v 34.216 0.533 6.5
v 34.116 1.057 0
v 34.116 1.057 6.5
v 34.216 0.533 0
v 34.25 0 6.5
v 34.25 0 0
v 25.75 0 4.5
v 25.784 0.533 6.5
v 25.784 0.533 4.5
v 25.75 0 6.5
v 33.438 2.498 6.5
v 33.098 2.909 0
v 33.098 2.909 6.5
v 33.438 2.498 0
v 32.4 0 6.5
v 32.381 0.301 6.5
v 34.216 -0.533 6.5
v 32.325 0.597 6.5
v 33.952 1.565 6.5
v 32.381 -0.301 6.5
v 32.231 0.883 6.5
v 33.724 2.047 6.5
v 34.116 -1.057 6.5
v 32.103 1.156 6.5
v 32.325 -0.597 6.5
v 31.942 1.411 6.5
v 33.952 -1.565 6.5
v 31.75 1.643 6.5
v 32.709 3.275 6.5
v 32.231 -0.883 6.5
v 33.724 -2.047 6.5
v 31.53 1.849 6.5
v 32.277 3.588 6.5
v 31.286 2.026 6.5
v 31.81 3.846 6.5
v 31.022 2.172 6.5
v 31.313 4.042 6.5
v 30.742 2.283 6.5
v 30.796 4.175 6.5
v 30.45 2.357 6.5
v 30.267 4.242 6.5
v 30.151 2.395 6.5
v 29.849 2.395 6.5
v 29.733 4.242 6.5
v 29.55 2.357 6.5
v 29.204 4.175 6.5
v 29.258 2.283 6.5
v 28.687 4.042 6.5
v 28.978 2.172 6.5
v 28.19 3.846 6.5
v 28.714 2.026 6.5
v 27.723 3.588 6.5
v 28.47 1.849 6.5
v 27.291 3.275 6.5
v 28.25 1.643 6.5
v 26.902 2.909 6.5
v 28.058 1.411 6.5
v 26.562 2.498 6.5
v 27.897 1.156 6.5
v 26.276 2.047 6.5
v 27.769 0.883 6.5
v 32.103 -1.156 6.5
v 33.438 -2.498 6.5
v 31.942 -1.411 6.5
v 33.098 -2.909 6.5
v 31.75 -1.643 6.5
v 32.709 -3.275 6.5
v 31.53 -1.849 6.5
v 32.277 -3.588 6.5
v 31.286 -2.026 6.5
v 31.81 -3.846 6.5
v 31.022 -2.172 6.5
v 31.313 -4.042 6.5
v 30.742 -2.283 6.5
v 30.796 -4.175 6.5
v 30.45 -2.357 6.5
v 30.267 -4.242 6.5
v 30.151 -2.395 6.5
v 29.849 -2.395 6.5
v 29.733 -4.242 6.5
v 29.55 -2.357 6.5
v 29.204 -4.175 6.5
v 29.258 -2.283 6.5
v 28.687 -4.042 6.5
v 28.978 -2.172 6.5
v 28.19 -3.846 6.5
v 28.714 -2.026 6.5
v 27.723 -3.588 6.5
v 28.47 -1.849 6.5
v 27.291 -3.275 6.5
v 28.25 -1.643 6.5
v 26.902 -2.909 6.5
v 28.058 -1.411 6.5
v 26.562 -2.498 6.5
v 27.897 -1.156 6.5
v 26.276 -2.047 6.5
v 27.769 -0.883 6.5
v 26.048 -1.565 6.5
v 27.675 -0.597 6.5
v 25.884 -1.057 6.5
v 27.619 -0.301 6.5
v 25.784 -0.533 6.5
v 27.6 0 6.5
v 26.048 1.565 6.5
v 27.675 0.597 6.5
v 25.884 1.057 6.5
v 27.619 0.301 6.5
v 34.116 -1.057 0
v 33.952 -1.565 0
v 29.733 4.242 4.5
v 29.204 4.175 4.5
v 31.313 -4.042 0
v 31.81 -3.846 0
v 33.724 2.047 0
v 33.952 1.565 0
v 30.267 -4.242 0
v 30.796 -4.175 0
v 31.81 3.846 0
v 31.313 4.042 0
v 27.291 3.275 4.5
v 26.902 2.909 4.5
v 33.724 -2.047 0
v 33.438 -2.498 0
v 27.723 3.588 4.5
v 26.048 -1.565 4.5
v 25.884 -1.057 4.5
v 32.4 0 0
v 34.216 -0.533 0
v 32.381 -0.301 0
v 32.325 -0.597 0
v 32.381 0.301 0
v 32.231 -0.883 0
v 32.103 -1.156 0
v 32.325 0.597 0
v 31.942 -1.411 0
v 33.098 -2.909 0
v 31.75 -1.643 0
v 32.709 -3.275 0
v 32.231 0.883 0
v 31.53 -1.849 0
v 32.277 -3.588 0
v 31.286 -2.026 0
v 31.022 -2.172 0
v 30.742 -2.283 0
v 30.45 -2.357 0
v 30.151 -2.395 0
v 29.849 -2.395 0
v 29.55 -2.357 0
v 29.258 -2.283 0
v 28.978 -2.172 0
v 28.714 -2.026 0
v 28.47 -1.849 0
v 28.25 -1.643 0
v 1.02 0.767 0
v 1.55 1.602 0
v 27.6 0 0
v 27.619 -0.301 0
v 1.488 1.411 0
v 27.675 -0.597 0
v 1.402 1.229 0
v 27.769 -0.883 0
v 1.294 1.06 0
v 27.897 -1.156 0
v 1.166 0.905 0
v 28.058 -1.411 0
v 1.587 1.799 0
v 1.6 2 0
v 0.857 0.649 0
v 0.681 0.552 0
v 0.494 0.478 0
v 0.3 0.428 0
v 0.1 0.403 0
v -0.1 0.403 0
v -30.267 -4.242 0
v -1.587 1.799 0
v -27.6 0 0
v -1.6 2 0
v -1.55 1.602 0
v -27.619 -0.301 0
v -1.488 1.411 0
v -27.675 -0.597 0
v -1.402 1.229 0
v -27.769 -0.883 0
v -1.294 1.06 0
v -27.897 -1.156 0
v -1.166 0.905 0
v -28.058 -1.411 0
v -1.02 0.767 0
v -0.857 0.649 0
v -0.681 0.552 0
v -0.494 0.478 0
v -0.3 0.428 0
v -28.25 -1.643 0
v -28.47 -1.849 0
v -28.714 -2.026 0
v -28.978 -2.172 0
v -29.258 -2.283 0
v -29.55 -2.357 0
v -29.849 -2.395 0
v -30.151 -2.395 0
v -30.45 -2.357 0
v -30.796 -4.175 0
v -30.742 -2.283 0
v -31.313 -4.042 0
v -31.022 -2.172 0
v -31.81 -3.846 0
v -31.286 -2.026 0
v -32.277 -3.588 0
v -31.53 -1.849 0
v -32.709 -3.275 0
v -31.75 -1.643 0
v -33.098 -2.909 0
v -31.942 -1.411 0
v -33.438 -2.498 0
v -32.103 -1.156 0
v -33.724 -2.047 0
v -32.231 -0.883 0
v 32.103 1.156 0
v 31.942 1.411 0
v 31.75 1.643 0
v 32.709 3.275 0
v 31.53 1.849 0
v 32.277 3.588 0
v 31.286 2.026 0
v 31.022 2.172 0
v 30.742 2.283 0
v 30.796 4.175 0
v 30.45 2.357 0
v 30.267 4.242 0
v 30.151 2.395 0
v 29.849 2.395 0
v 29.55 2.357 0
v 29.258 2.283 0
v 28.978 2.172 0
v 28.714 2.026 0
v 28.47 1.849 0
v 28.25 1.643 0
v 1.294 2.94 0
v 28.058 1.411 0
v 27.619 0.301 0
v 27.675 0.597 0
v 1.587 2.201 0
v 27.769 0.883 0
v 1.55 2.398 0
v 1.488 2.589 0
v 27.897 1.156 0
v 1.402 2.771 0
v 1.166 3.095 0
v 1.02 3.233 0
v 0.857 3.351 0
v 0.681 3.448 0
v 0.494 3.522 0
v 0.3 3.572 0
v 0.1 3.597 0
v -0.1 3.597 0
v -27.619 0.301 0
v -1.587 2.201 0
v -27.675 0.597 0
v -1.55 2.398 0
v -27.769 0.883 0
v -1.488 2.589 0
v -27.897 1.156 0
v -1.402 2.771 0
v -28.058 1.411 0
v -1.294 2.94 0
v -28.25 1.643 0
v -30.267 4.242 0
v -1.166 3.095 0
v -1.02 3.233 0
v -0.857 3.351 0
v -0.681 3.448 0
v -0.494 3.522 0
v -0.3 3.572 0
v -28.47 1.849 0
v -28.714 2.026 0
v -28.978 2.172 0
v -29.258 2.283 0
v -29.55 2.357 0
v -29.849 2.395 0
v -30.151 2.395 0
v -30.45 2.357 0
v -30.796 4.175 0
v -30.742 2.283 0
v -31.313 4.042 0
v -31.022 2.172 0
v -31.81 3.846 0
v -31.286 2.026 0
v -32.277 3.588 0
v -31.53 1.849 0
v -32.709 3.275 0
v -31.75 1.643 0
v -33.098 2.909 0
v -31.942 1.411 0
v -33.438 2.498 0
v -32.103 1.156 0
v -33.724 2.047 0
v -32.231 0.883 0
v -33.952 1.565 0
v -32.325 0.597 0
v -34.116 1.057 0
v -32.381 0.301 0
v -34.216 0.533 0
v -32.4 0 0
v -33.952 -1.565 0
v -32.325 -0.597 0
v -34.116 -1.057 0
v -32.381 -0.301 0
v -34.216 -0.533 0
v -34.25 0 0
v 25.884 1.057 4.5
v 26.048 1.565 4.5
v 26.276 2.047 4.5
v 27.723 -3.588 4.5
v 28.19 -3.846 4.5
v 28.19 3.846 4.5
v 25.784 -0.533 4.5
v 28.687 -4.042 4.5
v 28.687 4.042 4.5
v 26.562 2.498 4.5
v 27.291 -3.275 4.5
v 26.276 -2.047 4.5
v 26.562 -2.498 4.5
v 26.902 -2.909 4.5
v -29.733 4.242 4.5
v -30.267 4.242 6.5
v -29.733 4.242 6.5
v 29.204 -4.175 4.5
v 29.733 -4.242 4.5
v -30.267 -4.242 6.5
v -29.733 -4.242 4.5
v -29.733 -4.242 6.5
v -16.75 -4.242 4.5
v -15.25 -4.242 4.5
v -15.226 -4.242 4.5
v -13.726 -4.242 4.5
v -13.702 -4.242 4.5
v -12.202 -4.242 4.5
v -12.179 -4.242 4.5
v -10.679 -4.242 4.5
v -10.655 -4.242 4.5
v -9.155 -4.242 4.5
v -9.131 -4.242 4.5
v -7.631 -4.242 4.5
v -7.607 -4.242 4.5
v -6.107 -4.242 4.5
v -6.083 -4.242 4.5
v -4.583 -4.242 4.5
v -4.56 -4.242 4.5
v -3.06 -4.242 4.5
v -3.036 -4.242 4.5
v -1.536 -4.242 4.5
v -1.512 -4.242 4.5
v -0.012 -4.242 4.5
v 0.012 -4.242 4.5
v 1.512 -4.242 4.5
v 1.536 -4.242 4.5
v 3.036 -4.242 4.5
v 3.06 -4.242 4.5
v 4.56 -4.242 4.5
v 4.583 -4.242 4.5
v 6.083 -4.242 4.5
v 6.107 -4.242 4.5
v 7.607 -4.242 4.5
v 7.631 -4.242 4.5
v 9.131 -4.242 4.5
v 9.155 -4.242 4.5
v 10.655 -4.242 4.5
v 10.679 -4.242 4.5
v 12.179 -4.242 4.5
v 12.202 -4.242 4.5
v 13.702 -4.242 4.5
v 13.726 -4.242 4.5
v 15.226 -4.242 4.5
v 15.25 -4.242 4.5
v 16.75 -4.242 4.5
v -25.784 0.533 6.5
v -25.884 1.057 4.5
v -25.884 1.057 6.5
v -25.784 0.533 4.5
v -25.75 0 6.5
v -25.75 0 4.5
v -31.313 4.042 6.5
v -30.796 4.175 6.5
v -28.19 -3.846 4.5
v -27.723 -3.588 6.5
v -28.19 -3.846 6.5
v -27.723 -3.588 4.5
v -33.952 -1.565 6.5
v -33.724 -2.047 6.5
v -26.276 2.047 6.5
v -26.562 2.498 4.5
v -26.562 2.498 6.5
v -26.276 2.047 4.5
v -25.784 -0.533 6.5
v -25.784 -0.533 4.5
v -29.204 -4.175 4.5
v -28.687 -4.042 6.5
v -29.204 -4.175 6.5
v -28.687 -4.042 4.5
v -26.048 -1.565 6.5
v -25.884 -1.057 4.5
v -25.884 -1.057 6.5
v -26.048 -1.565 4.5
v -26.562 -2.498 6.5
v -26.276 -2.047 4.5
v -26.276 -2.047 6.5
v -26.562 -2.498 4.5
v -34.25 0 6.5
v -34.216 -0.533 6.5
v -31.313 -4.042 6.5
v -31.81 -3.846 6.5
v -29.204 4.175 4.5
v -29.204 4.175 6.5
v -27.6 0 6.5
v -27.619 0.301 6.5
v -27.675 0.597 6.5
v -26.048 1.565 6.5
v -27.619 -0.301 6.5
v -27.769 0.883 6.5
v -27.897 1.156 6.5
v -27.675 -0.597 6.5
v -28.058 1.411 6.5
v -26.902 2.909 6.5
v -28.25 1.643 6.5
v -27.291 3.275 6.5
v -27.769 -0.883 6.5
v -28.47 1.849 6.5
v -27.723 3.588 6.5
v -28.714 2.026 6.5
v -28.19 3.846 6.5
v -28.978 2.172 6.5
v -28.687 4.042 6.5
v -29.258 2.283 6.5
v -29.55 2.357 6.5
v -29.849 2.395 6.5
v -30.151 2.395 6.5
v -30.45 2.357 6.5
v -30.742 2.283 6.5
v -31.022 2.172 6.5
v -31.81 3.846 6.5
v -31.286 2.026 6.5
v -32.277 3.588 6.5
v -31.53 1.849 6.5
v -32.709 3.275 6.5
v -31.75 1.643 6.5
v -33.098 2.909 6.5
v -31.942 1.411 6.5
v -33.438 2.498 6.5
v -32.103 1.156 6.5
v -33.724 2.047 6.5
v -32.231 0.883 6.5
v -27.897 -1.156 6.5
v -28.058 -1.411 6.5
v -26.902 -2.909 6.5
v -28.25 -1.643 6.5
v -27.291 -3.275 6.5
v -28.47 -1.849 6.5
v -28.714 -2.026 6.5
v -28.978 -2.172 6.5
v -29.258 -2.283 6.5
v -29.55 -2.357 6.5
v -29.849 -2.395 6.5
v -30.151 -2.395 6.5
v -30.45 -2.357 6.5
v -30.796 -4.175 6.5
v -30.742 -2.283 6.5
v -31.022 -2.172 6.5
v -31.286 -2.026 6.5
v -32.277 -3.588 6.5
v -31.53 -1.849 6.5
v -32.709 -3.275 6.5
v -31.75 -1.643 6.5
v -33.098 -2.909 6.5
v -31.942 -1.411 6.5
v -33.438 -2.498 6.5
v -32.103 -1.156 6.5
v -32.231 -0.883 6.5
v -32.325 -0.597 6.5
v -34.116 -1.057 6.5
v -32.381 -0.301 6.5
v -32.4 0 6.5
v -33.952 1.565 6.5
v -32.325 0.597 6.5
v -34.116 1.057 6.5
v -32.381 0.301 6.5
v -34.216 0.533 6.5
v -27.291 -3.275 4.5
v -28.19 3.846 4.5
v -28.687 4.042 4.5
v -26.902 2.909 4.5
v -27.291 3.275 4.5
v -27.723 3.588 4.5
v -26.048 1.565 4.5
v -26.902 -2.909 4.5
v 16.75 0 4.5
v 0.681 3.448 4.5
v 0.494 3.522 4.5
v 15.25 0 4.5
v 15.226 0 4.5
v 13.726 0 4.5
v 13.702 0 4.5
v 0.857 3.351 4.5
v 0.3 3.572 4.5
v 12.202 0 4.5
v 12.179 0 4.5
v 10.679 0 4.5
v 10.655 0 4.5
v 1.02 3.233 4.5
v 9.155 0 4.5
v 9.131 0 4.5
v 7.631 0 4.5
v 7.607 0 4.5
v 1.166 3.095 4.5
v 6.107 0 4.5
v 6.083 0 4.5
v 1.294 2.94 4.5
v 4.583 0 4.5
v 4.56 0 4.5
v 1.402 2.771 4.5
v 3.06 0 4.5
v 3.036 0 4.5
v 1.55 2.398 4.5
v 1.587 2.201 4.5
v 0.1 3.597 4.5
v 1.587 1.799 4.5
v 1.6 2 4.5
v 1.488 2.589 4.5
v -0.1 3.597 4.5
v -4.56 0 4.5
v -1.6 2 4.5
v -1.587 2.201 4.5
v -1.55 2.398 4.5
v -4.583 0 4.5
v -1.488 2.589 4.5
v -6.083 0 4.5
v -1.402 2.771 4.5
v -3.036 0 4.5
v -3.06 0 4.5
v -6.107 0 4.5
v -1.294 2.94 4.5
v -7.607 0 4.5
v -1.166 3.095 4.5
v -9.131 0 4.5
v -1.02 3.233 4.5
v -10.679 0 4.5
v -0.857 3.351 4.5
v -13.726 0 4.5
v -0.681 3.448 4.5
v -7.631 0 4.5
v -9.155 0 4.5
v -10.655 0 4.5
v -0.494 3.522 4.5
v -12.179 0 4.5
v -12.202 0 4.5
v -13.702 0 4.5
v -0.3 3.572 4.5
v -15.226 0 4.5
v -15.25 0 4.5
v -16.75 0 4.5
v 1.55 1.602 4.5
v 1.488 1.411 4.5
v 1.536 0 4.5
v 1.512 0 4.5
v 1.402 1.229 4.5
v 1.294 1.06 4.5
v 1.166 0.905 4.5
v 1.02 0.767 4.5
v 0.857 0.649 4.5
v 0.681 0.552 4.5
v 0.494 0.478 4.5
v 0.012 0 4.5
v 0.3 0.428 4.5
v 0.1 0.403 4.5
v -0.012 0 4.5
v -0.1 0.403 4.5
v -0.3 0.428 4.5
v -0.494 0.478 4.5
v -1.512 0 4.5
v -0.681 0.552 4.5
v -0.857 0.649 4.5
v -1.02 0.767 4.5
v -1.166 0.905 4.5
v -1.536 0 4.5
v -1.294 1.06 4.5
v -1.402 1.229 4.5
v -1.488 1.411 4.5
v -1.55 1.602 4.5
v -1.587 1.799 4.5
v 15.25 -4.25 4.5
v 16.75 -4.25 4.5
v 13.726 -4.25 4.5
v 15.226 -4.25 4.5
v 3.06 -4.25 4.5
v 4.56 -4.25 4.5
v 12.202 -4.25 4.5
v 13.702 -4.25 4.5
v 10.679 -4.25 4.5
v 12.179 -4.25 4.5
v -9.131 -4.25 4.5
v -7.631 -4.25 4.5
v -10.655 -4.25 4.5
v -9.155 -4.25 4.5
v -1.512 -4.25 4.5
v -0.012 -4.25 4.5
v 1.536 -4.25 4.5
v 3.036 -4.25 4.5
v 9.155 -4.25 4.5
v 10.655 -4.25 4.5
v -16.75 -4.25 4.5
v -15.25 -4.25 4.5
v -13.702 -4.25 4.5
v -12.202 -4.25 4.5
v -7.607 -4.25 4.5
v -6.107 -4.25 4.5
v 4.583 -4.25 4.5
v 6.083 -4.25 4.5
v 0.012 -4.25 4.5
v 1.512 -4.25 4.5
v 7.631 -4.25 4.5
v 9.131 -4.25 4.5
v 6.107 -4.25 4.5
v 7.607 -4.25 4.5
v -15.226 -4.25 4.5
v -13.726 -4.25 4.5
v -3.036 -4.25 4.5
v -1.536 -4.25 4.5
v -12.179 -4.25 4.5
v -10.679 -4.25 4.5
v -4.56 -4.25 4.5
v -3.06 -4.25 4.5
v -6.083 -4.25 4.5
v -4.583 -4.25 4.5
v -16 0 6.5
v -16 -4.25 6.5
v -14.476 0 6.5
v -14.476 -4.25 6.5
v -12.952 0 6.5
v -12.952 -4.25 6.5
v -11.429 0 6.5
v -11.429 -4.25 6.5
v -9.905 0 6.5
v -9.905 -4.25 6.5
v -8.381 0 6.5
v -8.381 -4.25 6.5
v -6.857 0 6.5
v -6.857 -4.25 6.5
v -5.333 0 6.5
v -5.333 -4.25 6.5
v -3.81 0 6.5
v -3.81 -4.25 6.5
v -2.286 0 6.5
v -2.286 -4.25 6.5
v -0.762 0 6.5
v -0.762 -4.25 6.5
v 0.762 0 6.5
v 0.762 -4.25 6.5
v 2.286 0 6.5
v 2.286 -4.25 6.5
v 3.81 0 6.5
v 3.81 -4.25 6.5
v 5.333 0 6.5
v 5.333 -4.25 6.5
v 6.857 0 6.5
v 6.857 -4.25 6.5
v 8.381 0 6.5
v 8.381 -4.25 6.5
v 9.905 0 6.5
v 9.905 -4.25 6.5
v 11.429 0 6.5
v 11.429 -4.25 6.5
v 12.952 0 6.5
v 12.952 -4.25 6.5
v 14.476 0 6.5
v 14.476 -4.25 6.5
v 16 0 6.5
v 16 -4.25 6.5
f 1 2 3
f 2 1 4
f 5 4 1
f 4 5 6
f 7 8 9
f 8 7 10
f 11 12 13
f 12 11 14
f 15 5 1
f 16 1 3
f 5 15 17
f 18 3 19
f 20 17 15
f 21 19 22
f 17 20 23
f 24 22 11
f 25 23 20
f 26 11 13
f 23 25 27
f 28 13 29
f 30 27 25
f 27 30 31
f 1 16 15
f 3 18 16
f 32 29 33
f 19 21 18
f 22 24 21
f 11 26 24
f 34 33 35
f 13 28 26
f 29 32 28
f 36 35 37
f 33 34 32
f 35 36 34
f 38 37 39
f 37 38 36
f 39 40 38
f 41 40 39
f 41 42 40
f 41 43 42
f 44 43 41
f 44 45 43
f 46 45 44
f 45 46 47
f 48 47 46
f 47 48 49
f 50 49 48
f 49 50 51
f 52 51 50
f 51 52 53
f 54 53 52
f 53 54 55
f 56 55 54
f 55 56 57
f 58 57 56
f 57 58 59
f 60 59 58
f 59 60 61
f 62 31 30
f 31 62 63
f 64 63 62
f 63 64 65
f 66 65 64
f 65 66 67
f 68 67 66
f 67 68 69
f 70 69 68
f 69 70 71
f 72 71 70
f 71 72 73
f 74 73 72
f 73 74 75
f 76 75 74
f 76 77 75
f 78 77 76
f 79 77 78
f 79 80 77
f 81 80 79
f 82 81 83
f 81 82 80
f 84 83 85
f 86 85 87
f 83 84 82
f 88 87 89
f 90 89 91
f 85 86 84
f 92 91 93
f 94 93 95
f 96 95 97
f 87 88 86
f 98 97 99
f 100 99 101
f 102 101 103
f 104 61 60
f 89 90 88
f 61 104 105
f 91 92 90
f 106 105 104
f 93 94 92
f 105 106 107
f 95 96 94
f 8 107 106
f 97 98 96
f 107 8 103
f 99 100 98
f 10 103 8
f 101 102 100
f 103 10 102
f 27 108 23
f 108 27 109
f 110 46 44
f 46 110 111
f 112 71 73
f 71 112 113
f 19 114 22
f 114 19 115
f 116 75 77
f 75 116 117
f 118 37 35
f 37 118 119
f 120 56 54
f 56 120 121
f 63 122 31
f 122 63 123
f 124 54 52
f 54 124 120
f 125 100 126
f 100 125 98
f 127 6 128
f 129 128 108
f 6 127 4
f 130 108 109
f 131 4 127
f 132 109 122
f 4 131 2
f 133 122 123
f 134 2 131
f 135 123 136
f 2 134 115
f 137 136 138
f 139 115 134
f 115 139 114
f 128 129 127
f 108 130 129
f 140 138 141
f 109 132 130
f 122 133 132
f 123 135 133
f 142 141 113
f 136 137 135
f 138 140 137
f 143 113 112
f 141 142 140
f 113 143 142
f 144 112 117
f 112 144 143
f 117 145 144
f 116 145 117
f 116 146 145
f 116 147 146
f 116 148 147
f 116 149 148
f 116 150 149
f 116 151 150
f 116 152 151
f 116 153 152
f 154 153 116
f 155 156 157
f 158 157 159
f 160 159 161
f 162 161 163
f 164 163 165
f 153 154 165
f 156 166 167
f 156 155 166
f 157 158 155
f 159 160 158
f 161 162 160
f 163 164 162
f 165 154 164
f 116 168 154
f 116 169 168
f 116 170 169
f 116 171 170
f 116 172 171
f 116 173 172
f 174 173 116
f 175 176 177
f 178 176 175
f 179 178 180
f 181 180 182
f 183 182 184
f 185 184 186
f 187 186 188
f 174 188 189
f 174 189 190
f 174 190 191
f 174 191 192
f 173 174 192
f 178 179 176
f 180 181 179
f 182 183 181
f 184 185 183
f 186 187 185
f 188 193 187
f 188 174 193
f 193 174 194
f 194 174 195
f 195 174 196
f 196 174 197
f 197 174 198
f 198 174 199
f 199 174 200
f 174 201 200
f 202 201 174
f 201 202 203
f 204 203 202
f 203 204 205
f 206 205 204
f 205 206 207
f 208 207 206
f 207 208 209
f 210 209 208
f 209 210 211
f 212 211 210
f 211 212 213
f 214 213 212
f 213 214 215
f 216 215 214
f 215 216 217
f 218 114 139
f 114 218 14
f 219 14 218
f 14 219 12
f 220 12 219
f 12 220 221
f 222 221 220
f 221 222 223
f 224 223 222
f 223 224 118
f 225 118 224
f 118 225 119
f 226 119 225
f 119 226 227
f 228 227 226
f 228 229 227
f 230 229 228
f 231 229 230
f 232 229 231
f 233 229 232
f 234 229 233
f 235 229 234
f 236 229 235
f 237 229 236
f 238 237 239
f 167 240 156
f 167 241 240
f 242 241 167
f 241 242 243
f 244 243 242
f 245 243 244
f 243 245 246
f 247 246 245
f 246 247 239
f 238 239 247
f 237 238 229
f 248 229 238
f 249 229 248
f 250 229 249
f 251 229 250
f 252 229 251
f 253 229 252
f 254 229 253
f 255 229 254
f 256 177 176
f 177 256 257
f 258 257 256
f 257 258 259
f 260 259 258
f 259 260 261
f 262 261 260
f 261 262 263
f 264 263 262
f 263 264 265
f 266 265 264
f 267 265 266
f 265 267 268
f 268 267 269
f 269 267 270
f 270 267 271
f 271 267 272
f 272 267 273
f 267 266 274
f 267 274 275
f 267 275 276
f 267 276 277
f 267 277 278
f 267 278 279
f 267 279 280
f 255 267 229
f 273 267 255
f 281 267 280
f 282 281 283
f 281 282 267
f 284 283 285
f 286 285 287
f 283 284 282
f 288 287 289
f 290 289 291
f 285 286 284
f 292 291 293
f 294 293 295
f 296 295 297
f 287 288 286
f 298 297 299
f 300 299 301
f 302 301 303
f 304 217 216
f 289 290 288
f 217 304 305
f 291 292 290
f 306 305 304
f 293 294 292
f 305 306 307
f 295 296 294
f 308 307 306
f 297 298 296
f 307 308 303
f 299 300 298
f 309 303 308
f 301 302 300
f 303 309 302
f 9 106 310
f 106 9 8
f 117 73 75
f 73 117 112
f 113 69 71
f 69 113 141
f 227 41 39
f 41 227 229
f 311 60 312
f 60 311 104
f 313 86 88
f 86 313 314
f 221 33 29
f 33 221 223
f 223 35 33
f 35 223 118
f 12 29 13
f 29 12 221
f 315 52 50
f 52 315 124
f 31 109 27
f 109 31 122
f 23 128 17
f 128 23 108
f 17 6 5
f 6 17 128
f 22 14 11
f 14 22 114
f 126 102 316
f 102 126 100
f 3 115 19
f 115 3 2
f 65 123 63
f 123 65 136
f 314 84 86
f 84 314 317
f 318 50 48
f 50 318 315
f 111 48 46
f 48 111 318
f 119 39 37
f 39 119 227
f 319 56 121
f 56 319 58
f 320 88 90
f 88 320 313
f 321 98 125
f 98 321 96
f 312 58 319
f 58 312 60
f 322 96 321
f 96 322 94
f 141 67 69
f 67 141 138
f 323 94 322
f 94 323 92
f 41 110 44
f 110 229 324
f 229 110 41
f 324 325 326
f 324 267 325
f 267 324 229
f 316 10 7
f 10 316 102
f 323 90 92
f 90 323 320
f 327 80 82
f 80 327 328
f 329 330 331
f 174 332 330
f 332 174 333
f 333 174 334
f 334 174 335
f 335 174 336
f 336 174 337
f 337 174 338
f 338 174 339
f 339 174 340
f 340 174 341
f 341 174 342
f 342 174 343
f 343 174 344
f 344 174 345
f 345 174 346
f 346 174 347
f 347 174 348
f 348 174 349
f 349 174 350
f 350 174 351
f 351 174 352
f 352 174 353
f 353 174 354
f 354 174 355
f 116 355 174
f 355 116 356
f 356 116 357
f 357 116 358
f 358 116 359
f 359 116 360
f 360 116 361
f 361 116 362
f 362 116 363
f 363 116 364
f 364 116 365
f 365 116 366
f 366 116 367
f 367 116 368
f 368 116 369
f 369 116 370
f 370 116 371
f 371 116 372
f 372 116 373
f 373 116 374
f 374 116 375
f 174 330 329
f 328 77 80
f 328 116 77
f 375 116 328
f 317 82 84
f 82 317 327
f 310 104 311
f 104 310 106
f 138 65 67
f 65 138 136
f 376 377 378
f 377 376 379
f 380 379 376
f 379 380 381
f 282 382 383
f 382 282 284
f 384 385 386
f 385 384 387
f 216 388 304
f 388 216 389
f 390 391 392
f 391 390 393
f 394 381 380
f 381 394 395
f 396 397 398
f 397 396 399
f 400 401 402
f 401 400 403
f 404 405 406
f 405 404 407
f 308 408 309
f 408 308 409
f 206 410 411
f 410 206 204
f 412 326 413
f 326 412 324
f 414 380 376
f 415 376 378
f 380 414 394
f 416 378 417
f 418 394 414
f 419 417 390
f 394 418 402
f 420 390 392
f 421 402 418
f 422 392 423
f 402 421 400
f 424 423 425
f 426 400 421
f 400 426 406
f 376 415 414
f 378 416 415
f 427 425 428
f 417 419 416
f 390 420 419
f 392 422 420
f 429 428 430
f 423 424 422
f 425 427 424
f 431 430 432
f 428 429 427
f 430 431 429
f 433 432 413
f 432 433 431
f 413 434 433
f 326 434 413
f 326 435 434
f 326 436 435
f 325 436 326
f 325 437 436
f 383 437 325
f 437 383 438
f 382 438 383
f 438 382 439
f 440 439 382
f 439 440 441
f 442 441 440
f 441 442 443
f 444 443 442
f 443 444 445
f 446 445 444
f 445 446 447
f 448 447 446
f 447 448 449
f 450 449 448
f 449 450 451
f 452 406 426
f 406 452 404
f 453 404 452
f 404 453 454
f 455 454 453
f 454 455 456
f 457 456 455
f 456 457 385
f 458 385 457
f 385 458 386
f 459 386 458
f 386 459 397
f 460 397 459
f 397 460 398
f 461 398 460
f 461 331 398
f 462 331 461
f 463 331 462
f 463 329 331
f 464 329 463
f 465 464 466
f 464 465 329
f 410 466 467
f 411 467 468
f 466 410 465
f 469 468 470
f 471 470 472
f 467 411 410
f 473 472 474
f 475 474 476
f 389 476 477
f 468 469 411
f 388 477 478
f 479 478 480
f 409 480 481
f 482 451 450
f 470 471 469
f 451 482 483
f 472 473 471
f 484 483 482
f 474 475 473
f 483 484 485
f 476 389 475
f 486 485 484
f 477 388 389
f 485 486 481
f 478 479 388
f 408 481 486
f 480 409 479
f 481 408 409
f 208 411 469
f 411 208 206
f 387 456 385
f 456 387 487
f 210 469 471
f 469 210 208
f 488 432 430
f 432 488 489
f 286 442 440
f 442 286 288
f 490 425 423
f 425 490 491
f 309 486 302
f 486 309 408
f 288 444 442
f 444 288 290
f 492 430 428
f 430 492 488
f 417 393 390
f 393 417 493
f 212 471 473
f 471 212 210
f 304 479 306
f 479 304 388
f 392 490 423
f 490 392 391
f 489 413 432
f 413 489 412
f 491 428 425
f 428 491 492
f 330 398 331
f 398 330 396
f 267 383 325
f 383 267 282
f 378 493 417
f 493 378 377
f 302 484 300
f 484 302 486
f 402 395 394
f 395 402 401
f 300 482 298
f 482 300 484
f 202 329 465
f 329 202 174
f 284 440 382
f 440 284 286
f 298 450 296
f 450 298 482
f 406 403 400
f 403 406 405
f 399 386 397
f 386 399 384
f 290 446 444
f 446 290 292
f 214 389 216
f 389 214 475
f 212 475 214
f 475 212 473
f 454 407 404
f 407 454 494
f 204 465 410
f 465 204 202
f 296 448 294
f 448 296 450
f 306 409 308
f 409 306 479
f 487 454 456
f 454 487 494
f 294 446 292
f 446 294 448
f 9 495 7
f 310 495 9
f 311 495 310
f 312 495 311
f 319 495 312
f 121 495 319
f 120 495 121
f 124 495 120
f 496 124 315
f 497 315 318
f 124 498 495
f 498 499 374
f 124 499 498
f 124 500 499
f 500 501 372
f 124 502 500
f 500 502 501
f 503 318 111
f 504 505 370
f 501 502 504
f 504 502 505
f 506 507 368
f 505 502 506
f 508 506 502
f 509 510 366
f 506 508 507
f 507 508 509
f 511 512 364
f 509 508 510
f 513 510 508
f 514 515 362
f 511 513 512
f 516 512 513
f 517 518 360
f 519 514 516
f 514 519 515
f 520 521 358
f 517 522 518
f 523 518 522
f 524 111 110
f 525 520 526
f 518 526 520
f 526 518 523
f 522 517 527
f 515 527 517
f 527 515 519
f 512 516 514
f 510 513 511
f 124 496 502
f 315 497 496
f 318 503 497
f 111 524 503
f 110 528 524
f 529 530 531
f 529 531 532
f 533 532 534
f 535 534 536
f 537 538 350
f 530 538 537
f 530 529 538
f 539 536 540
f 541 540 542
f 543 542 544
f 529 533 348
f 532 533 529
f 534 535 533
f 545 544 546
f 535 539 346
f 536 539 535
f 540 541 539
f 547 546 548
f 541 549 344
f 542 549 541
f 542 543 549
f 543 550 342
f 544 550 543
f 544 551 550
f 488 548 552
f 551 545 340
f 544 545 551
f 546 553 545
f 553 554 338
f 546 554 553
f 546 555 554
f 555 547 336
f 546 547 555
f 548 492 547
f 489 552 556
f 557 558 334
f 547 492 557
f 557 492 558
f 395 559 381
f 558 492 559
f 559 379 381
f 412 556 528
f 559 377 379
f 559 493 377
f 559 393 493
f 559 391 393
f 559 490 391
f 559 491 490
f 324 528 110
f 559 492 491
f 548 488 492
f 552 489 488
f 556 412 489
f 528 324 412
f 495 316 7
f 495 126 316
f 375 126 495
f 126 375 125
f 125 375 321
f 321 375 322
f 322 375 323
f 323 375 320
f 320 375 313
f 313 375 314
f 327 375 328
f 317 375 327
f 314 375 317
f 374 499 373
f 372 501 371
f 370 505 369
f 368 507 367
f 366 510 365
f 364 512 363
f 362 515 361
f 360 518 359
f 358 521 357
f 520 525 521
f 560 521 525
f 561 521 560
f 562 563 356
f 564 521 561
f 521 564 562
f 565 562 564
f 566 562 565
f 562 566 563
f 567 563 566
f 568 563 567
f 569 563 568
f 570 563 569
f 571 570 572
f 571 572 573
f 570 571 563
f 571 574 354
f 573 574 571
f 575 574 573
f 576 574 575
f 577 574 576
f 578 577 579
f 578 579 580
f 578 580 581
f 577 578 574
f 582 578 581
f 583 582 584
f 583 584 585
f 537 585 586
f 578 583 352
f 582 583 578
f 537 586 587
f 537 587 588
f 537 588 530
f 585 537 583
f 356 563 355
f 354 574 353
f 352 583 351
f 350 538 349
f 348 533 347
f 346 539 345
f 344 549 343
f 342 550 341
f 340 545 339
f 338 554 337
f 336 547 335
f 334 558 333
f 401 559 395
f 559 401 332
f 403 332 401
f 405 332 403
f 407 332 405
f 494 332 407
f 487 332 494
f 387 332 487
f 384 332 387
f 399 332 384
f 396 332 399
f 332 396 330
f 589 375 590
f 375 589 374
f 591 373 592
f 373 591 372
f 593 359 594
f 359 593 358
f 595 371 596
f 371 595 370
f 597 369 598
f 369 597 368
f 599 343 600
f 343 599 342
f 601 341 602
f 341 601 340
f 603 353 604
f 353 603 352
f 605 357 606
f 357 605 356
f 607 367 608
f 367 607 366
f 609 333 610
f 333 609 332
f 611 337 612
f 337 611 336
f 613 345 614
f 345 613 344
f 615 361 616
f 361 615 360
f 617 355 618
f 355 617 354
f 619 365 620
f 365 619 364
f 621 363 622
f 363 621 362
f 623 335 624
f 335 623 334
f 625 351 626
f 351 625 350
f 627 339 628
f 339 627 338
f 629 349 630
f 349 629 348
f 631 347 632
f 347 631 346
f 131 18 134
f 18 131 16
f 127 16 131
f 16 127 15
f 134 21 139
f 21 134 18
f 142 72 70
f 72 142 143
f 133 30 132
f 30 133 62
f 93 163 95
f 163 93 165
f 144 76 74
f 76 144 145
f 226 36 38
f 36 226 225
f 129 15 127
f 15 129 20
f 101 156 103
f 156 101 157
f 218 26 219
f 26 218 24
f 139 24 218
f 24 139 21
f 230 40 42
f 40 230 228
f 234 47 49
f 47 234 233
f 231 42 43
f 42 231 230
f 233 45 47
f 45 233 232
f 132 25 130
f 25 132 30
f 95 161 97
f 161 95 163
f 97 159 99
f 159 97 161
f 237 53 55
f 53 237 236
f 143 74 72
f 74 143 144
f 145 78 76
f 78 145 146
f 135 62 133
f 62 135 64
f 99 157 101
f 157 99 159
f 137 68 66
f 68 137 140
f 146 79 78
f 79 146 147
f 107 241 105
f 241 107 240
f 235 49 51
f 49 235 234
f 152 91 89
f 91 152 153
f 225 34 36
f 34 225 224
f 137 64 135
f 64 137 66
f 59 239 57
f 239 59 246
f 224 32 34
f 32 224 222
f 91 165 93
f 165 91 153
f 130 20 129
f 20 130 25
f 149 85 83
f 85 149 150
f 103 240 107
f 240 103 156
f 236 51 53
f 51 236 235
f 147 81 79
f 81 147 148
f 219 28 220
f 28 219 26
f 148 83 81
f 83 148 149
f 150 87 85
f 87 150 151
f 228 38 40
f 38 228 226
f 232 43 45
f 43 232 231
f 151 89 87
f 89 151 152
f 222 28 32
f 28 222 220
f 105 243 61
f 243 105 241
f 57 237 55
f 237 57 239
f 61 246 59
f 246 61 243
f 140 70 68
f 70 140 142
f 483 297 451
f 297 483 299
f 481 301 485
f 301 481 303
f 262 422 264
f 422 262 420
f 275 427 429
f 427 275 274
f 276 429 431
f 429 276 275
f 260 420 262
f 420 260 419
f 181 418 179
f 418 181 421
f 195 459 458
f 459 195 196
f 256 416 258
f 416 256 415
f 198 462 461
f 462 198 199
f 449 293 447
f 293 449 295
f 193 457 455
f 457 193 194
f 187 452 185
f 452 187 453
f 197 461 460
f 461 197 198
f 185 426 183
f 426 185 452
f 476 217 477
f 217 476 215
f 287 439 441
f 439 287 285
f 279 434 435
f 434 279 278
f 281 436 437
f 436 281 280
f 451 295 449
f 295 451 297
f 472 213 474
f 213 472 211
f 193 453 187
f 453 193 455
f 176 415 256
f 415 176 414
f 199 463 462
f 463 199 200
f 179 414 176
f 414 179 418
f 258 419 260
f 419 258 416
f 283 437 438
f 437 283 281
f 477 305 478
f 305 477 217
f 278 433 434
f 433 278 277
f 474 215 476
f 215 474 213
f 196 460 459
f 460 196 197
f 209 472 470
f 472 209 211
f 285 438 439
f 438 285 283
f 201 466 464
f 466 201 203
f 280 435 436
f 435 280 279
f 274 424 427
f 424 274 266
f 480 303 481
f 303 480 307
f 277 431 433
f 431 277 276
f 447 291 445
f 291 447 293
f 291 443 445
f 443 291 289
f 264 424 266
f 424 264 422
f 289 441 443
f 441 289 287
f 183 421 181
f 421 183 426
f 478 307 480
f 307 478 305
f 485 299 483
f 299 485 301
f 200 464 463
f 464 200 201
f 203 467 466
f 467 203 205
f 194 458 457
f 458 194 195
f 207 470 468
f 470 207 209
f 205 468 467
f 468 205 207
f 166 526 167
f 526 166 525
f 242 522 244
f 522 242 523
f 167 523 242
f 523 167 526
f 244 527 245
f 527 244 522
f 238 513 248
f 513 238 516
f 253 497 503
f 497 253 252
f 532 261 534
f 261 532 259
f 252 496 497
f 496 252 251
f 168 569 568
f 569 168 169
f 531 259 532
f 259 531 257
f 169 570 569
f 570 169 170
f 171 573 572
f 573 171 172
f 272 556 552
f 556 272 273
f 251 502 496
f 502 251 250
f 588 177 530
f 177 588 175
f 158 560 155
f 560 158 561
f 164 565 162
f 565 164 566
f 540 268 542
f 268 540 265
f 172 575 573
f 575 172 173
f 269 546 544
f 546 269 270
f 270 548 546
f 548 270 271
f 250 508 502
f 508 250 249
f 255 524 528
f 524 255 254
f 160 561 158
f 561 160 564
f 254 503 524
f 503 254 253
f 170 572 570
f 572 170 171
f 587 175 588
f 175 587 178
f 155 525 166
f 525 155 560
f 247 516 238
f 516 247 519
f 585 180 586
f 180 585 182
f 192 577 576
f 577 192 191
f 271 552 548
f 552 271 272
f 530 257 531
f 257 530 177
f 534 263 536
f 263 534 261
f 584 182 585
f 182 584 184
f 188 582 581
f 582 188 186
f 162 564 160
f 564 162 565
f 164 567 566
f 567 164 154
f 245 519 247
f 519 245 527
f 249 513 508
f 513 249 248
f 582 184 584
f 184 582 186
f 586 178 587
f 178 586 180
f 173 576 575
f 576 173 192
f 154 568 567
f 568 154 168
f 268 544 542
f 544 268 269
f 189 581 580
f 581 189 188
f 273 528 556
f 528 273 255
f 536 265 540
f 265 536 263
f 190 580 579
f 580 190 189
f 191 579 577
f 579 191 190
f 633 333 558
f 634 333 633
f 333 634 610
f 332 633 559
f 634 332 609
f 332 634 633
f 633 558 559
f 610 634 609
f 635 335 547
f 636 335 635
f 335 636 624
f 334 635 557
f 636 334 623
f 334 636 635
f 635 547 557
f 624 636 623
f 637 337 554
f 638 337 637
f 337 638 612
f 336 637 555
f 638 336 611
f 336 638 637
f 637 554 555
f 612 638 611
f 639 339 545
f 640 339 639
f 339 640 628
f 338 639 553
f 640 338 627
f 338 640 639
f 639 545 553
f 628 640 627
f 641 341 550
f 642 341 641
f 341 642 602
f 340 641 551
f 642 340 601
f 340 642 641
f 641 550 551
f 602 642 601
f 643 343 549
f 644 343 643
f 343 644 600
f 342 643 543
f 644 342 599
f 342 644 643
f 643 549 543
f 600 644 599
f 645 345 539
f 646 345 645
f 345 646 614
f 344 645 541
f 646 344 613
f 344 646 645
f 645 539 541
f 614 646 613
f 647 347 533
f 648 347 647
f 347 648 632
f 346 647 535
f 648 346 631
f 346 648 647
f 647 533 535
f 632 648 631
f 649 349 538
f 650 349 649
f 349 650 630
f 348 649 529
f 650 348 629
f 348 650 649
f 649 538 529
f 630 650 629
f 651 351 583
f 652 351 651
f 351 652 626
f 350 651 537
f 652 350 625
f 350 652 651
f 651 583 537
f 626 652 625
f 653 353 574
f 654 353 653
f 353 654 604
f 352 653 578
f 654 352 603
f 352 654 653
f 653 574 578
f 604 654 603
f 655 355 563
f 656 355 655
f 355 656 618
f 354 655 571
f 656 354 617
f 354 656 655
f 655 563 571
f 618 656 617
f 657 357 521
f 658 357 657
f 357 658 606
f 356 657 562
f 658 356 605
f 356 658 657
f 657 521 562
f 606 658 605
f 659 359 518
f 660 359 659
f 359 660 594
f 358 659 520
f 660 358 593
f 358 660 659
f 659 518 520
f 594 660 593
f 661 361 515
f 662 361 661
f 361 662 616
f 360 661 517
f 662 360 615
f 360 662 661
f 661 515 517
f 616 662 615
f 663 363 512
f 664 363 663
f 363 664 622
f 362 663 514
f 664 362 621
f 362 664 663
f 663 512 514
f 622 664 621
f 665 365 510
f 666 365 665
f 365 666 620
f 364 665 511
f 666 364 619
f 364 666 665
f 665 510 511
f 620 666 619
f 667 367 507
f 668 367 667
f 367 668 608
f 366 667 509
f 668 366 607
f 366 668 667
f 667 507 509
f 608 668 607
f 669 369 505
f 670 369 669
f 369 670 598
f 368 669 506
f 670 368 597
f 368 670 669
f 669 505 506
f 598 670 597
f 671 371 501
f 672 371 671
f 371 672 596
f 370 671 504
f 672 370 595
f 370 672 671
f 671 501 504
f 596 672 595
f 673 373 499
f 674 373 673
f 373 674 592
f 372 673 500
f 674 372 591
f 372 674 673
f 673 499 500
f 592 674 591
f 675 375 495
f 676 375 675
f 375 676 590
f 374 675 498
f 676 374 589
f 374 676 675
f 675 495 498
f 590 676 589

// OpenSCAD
$fn = 50;

difference() {
    union() {
        translate([60/2,0,0]) cylinder(6.5,8.5/2,8.5/2);
        translate([-60/2,0,0]) cylinder(6.5,8.5/2,8.5/2);    
        hull() {
            translate([60/2,0,0]) cylinder(4.5,8.5/2,8.5/2);
            translate([-60/2,0,0]) cylinder(4.5,8.5/2,8.5/2);
        }
    }
    translate([60/2,0,0]) cylinder(6.5,4.8/2,4.8/2);
    translate([-60/2,0,0]) cylinder(6.5,4.8/2,4.8/2);
    translate([0,2,0]) cylinder(4.5,3.2/2,3.2/2);
}

length=32;
teeth=21;
for (i=[0:teeth]) {
    difference() {
        hull() {
            translate([-length/2+i*(length/teeth),0.5,4.5]) cylinder(r1=0.75,r2=0,2);
            translate([-length/2+i*(length/teeth),-4.5,4.5]) cylinder(r1=0.75,r2=0,2);    
        }
        translate([-length/2+i*(length/teeth)-5/2,0,3]) cube([5,5,5]);
        translate([-length/2+i*(length/teeth)-5/2,-9.25,3]) cube([5,5,5]);
    }
}
